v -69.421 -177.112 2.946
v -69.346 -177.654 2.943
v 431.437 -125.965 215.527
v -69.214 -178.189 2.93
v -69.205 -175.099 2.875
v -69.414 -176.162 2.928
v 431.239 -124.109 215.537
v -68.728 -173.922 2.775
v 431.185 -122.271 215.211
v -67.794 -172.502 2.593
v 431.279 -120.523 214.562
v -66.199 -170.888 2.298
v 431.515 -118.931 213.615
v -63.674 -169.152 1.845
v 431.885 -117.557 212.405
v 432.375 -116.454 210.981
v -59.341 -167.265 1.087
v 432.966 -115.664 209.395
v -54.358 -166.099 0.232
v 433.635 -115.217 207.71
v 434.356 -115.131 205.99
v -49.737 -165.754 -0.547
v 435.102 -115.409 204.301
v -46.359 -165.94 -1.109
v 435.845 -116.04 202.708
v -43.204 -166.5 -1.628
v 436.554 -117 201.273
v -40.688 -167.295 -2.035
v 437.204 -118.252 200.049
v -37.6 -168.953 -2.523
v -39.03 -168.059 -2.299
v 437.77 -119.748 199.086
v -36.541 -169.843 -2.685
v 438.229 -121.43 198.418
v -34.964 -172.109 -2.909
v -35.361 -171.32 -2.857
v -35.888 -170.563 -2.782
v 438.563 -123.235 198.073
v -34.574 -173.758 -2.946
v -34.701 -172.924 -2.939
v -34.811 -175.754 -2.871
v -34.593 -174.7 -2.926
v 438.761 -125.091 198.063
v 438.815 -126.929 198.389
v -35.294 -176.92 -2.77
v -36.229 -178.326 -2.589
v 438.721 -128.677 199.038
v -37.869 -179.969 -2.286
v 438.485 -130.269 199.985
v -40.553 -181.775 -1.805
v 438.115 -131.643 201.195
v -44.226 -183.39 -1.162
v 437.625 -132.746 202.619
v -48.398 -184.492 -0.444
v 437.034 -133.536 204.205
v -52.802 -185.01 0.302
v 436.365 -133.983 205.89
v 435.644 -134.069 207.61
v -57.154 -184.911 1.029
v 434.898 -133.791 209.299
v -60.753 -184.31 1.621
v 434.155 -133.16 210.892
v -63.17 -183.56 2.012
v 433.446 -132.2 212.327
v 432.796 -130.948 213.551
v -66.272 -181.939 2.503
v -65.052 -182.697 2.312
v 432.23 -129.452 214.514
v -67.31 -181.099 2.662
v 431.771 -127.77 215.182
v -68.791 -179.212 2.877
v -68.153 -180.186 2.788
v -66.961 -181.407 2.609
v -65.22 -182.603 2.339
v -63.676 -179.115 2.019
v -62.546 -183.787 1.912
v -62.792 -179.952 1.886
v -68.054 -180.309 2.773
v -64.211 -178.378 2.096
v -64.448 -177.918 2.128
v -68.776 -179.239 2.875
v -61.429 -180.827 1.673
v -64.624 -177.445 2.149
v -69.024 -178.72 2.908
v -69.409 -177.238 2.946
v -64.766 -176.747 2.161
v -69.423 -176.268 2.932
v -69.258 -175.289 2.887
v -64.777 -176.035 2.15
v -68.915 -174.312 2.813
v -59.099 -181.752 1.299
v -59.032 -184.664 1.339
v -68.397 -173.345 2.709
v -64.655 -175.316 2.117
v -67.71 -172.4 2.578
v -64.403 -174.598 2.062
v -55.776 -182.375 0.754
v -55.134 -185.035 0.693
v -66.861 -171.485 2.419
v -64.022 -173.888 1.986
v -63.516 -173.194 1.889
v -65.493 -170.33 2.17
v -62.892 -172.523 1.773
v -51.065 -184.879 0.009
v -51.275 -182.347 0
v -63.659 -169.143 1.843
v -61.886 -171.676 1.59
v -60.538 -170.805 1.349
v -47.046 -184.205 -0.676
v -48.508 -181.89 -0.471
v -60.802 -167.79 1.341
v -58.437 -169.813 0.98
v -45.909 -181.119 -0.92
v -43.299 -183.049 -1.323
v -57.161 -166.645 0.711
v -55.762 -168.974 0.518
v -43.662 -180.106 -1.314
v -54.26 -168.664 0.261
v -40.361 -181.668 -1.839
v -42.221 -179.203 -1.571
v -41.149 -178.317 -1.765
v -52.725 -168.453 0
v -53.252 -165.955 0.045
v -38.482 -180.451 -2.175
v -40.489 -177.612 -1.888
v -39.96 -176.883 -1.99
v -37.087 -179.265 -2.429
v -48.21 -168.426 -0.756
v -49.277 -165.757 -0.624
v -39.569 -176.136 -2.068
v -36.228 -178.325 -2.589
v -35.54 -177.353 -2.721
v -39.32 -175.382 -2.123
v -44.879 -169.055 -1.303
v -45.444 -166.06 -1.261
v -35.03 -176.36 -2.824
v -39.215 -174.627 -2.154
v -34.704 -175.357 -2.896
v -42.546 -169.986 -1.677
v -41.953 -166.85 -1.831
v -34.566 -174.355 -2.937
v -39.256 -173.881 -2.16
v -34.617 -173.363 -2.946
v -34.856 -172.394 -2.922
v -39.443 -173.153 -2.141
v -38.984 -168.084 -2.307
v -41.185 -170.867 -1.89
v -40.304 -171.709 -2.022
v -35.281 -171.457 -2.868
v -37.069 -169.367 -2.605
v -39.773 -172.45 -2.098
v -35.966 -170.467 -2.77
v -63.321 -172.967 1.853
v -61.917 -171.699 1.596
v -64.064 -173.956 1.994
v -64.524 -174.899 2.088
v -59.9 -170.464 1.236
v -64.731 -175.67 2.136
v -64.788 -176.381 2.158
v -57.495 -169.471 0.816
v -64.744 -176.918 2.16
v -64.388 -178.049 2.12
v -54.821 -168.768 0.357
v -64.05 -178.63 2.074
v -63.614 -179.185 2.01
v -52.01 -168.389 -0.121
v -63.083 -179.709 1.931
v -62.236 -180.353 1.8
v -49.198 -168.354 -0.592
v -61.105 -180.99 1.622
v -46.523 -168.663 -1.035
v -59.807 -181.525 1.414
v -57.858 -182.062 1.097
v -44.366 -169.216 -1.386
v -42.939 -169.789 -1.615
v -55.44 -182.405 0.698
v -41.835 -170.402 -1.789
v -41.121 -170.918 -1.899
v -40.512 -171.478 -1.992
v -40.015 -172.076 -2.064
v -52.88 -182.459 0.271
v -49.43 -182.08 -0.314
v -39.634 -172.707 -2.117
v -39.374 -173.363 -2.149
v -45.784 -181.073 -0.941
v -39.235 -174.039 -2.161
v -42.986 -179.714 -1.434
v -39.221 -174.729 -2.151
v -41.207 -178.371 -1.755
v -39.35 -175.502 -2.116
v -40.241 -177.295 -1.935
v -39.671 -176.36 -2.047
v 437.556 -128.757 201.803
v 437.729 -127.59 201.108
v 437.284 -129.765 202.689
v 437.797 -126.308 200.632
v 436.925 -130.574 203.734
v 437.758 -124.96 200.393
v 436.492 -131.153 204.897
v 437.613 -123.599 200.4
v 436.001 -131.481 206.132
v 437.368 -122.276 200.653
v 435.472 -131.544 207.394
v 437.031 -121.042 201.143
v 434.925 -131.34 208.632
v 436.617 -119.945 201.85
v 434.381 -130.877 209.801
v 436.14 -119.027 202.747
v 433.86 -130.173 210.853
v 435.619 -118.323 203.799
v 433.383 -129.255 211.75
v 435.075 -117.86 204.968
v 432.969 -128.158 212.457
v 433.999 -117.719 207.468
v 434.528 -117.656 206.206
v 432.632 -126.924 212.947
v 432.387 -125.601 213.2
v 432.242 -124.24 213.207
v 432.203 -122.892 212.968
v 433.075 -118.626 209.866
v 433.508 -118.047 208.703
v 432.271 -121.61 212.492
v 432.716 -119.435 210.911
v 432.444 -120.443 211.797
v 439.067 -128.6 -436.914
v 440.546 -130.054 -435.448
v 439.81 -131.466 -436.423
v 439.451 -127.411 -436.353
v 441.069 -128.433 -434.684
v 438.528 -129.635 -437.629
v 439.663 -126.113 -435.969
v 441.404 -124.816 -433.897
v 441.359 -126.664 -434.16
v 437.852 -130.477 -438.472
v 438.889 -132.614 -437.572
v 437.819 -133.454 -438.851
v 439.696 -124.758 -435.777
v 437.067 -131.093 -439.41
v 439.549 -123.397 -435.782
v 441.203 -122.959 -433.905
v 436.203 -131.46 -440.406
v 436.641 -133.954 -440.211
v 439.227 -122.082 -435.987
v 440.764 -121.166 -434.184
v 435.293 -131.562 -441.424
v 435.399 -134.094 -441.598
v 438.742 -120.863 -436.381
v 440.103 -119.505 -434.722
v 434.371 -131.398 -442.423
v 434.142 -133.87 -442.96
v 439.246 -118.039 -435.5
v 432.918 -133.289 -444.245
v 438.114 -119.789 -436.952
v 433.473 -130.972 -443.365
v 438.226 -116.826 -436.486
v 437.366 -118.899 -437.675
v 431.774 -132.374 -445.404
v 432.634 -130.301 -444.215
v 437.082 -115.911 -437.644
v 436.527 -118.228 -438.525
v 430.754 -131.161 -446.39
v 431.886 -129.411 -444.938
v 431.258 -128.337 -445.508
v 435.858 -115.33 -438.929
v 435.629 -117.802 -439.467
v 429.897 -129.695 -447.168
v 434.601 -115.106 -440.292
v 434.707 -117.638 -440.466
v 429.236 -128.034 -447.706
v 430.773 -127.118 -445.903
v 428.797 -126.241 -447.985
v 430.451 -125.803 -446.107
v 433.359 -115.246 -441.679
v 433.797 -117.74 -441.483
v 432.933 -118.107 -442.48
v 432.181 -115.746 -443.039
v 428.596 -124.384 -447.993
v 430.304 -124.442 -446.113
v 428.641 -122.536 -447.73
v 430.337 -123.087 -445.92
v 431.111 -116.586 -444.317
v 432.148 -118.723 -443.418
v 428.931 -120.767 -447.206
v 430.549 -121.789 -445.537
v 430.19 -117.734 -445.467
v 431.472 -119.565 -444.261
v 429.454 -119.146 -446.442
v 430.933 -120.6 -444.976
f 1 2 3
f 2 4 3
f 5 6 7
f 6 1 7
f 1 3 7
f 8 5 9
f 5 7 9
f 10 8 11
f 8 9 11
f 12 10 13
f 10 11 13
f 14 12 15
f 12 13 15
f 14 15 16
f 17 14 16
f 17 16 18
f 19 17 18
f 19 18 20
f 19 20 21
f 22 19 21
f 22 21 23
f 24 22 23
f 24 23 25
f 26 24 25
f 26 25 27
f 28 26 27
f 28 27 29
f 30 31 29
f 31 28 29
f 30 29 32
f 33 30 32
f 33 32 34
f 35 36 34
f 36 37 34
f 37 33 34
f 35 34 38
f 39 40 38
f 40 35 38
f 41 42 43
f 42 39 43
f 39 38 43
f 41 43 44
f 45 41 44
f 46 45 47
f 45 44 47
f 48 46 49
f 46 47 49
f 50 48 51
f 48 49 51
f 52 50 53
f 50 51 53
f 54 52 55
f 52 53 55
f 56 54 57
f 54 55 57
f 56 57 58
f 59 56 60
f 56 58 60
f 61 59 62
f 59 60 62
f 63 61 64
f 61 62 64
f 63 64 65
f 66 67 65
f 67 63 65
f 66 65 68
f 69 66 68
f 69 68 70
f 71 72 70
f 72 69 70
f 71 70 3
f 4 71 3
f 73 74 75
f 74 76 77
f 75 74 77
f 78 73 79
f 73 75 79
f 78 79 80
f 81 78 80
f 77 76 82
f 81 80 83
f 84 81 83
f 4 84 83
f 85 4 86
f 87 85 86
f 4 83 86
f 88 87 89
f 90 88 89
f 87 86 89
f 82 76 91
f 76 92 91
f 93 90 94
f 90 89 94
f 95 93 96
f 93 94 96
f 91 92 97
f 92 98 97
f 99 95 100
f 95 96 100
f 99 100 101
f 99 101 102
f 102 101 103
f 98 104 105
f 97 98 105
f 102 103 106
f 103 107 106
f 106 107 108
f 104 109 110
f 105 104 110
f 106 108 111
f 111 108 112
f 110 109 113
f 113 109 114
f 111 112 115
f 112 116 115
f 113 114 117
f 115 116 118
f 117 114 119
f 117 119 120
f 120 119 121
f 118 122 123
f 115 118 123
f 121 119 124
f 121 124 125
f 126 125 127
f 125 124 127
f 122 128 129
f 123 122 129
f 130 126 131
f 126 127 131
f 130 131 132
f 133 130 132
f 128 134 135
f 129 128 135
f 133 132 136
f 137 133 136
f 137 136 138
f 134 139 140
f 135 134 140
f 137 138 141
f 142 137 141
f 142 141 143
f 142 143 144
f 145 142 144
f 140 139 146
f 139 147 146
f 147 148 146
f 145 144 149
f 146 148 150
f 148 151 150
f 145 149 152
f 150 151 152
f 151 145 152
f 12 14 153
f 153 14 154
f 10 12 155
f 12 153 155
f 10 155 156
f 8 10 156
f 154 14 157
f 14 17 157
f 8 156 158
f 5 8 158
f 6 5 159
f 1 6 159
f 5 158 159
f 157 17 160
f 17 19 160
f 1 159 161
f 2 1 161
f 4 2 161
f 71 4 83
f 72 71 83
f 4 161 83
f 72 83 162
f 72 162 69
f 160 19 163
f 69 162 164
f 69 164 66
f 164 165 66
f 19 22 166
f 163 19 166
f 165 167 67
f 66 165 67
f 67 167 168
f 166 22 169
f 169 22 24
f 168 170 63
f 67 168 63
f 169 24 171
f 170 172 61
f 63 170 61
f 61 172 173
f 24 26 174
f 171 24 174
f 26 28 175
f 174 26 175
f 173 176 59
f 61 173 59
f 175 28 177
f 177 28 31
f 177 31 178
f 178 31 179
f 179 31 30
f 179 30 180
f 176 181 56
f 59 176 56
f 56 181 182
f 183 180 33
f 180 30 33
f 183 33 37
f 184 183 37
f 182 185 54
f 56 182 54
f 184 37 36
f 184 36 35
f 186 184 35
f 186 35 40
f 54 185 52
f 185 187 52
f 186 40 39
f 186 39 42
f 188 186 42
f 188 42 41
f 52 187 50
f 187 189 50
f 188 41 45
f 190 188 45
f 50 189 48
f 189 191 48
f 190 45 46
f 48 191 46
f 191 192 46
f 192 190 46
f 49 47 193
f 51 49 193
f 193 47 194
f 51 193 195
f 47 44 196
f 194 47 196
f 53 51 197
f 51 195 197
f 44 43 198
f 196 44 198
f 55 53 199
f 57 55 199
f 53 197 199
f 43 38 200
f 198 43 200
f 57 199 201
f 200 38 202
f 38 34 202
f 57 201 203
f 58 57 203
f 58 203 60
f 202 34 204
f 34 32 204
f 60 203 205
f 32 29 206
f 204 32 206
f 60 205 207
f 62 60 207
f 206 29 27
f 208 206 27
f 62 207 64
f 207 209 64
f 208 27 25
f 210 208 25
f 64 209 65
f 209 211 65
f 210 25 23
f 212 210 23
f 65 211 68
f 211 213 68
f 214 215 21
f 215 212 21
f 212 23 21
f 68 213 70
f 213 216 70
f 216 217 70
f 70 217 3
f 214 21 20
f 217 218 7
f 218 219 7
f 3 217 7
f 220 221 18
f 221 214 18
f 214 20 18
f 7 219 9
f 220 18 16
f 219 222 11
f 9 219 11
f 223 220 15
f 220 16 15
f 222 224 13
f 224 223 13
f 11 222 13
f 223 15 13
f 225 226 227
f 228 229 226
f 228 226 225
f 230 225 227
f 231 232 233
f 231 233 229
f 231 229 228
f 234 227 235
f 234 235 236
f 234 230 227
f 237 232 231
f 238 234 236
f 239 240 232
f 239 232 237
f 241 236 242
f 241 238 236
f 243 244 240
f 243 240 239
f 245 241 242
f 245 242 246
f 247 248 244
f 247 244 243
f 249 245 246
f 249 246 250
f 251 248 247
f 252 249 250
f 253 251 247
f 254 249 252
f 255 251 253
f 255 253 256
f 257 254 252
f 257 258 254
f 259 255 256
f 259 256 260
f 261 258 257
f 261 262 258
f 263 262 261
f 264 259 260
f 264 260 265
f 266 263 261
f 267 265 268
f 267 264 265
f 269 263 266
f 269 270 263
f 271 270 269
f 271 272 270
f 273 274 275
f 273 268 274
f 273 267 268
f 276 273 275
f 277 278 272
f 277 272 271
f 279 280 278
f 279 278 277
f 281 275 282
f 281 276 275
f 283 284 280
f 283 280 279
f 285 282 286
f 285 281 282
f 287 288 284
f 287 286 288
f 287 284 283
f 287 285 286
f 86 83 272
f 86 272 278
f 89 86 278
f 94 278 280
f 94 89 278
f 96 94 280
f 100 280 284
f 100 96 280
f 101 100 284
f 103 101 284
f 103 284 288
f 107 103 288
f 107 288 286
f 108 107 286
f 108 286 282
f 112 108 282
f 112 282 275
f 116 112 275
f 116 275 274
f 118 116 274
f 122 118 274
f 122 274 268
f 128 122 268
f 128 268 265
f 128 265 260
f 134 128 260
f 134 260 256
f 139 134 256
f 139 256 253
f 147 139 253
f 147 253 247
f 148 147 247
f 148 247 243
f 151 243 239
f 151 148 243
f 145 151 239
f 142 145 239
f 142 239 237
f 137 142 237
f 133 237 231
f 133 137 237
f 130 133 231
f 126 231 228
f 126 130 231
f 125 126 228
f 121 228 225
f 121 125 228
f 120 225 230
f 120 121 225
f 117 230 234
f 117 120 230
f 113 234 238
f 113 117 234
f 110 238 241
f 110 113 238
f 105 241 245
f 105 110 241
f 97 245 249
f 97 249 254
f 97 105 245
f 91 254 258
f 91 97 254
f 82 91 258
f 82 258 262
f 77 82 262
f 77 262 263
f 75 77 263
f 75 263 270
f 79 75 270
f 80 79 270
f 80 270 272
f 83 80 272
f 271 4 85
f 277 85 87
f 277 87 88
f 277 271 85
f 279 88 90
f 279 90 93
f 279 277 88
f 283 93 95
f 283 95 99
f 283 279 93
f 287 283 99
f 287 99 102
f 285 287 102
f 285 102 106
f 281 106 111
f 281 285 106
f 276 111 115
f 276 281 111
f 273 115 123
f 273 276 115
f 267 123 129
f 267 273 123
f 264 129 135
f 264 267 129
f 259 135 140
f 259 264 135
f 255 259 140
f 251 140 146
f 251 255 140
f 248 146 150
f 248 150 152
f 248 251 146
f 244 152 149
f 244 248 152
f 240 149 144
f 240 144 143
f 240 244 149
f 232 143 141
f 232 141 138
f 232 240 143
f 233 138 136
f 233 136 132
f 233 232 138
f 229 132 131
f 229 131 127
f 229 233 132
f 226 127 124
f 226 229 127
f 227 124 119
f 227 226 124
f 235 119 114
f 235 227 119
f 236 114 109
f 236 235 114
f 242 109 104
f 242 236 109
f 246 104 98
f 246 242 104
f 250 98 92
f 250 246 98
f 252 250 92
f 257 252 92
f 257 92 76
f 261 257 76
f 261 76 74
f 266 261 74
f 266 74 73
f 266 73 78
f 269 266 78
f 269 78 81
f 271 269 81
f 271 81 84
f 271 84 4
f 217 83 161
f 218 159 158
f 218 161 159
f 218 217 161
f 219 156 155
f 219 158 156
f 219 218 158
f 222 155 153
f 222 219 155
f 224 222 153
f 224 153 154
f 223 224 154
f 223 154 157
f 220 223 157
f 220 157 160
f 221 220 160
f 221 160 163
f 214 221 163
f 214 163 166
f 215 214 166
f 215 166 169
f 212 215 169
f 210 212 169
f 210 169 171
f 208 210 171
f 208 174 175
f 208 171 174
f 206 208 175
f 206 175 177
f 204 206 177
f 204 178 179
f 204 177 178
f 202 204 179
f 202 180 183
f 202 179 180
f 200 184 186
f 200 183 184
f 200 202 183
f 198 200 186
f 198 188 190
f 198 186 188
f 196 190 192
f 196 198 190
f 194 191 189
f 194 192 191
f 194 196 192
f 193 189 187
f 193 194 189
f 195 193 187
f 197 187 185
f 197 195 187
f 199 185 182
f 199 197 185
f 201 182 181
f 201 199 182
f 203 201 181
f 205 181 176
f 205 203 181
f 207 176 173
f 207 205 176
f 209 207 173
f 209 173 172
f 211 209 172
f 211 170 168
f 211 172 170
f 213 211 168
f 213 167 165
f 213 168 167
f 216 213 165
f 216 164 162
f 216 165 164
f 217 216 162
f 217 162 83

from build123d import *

# Parameters (mm, degrees)
SKETCH1_ON_SEGMENT_1_R                         = 9.525
SKETCH1_ON_SEGMENT_1_R_2                       = 6.985
PIPE_STANDARD_S40_PIPE_1_SCH_40_1_DEPTH        = 553.706791842
SKETCH1_R                                      = 9.525
SKETCH1_R_2                                    = 6.985
PIPE_STANDARD_S40_PIPE_1_SCH_40_1_2_DEPTH      = 658.924913325
PIPE_STANDARD_S40_PIPE_1_SCH_40_1_2_DEPTH_BACK = 22.184562768


with BuildPart() as part:
    # Sketch1 on segment 1 (carried to segment 1) → Pipe standard s40 PIPE 1 SCH 40(1) (new body)
    with BuildSketch(Plane(origin=(435, -124.6, 206.8), x_dir=(-0.374119399, -0.143337301, 0.916236374), z_dir=(-0.916236374, -0.095574554, -0.389071216))):
        Circle(SKETCH1_ON_SEGMENT_1_R)
        Circle(SKETCH1_ON_SEGMENT_1_R_2, mode=Mode.SUBTRACT)
    extrude(amount=PIPE_STANDARD_S40_PIPE_1_SCH_40_1_DEPTH)

    # Pipe standard s40 PIPE 1 SCH 40(1) mitre
    split(bisect_by=Plane(origin=(-52, -175.4, 0), x_dir=(0, -0.999847575, 0.017459287), z_dir=(0.165079115, 0.017219752, 0.986129994)), keep=Keep.TOP)


with BuildPart() as body_2:
    # Sketch1 → Pipe standard s40 PIPE 1 SCH 40_1 2 (new, two sides)
    with BuildSketch(Plane(origin=(-52, -175.4, 0), x_dir=(-0.651221412426134, -0.17224239784648918, -0.7390826938724806), z_dir=(0.7390826938724807, 0.0770952789501411, -0.6691883812364028))) as pipe_standard_s40_pipe_1_sch_40_1_2_sk:
        Circle(SKETCH1_R)
        Circle(SKETCH1_R_2, mode=Mode.SUBTRACT)
    extrude(amount=PIPE_STANDARD_S40_PIPE_1_SCH_40_1_2_DEPTH)
    extrude(pipe_standard_s40_pipe_1_sch_40_1_2_sk.sketch, amount=-PIPE_STANDARD_S40_PIPE_1_SCH_40_1_2_DEPTH_BACK)

    # Pipe standard s40 PIPE 1 SCH 40_1 2 mitr
    split(bisect_by=Plane(origin=(-52, -175.4, 0), x_dir=(0, 0.999847575, -0.017459287), z_dir=(-0.165079115, -0.017219752, -0.986129994)), keep=Keep.TOP)


solid = Compound([part.part, body_2.part])
